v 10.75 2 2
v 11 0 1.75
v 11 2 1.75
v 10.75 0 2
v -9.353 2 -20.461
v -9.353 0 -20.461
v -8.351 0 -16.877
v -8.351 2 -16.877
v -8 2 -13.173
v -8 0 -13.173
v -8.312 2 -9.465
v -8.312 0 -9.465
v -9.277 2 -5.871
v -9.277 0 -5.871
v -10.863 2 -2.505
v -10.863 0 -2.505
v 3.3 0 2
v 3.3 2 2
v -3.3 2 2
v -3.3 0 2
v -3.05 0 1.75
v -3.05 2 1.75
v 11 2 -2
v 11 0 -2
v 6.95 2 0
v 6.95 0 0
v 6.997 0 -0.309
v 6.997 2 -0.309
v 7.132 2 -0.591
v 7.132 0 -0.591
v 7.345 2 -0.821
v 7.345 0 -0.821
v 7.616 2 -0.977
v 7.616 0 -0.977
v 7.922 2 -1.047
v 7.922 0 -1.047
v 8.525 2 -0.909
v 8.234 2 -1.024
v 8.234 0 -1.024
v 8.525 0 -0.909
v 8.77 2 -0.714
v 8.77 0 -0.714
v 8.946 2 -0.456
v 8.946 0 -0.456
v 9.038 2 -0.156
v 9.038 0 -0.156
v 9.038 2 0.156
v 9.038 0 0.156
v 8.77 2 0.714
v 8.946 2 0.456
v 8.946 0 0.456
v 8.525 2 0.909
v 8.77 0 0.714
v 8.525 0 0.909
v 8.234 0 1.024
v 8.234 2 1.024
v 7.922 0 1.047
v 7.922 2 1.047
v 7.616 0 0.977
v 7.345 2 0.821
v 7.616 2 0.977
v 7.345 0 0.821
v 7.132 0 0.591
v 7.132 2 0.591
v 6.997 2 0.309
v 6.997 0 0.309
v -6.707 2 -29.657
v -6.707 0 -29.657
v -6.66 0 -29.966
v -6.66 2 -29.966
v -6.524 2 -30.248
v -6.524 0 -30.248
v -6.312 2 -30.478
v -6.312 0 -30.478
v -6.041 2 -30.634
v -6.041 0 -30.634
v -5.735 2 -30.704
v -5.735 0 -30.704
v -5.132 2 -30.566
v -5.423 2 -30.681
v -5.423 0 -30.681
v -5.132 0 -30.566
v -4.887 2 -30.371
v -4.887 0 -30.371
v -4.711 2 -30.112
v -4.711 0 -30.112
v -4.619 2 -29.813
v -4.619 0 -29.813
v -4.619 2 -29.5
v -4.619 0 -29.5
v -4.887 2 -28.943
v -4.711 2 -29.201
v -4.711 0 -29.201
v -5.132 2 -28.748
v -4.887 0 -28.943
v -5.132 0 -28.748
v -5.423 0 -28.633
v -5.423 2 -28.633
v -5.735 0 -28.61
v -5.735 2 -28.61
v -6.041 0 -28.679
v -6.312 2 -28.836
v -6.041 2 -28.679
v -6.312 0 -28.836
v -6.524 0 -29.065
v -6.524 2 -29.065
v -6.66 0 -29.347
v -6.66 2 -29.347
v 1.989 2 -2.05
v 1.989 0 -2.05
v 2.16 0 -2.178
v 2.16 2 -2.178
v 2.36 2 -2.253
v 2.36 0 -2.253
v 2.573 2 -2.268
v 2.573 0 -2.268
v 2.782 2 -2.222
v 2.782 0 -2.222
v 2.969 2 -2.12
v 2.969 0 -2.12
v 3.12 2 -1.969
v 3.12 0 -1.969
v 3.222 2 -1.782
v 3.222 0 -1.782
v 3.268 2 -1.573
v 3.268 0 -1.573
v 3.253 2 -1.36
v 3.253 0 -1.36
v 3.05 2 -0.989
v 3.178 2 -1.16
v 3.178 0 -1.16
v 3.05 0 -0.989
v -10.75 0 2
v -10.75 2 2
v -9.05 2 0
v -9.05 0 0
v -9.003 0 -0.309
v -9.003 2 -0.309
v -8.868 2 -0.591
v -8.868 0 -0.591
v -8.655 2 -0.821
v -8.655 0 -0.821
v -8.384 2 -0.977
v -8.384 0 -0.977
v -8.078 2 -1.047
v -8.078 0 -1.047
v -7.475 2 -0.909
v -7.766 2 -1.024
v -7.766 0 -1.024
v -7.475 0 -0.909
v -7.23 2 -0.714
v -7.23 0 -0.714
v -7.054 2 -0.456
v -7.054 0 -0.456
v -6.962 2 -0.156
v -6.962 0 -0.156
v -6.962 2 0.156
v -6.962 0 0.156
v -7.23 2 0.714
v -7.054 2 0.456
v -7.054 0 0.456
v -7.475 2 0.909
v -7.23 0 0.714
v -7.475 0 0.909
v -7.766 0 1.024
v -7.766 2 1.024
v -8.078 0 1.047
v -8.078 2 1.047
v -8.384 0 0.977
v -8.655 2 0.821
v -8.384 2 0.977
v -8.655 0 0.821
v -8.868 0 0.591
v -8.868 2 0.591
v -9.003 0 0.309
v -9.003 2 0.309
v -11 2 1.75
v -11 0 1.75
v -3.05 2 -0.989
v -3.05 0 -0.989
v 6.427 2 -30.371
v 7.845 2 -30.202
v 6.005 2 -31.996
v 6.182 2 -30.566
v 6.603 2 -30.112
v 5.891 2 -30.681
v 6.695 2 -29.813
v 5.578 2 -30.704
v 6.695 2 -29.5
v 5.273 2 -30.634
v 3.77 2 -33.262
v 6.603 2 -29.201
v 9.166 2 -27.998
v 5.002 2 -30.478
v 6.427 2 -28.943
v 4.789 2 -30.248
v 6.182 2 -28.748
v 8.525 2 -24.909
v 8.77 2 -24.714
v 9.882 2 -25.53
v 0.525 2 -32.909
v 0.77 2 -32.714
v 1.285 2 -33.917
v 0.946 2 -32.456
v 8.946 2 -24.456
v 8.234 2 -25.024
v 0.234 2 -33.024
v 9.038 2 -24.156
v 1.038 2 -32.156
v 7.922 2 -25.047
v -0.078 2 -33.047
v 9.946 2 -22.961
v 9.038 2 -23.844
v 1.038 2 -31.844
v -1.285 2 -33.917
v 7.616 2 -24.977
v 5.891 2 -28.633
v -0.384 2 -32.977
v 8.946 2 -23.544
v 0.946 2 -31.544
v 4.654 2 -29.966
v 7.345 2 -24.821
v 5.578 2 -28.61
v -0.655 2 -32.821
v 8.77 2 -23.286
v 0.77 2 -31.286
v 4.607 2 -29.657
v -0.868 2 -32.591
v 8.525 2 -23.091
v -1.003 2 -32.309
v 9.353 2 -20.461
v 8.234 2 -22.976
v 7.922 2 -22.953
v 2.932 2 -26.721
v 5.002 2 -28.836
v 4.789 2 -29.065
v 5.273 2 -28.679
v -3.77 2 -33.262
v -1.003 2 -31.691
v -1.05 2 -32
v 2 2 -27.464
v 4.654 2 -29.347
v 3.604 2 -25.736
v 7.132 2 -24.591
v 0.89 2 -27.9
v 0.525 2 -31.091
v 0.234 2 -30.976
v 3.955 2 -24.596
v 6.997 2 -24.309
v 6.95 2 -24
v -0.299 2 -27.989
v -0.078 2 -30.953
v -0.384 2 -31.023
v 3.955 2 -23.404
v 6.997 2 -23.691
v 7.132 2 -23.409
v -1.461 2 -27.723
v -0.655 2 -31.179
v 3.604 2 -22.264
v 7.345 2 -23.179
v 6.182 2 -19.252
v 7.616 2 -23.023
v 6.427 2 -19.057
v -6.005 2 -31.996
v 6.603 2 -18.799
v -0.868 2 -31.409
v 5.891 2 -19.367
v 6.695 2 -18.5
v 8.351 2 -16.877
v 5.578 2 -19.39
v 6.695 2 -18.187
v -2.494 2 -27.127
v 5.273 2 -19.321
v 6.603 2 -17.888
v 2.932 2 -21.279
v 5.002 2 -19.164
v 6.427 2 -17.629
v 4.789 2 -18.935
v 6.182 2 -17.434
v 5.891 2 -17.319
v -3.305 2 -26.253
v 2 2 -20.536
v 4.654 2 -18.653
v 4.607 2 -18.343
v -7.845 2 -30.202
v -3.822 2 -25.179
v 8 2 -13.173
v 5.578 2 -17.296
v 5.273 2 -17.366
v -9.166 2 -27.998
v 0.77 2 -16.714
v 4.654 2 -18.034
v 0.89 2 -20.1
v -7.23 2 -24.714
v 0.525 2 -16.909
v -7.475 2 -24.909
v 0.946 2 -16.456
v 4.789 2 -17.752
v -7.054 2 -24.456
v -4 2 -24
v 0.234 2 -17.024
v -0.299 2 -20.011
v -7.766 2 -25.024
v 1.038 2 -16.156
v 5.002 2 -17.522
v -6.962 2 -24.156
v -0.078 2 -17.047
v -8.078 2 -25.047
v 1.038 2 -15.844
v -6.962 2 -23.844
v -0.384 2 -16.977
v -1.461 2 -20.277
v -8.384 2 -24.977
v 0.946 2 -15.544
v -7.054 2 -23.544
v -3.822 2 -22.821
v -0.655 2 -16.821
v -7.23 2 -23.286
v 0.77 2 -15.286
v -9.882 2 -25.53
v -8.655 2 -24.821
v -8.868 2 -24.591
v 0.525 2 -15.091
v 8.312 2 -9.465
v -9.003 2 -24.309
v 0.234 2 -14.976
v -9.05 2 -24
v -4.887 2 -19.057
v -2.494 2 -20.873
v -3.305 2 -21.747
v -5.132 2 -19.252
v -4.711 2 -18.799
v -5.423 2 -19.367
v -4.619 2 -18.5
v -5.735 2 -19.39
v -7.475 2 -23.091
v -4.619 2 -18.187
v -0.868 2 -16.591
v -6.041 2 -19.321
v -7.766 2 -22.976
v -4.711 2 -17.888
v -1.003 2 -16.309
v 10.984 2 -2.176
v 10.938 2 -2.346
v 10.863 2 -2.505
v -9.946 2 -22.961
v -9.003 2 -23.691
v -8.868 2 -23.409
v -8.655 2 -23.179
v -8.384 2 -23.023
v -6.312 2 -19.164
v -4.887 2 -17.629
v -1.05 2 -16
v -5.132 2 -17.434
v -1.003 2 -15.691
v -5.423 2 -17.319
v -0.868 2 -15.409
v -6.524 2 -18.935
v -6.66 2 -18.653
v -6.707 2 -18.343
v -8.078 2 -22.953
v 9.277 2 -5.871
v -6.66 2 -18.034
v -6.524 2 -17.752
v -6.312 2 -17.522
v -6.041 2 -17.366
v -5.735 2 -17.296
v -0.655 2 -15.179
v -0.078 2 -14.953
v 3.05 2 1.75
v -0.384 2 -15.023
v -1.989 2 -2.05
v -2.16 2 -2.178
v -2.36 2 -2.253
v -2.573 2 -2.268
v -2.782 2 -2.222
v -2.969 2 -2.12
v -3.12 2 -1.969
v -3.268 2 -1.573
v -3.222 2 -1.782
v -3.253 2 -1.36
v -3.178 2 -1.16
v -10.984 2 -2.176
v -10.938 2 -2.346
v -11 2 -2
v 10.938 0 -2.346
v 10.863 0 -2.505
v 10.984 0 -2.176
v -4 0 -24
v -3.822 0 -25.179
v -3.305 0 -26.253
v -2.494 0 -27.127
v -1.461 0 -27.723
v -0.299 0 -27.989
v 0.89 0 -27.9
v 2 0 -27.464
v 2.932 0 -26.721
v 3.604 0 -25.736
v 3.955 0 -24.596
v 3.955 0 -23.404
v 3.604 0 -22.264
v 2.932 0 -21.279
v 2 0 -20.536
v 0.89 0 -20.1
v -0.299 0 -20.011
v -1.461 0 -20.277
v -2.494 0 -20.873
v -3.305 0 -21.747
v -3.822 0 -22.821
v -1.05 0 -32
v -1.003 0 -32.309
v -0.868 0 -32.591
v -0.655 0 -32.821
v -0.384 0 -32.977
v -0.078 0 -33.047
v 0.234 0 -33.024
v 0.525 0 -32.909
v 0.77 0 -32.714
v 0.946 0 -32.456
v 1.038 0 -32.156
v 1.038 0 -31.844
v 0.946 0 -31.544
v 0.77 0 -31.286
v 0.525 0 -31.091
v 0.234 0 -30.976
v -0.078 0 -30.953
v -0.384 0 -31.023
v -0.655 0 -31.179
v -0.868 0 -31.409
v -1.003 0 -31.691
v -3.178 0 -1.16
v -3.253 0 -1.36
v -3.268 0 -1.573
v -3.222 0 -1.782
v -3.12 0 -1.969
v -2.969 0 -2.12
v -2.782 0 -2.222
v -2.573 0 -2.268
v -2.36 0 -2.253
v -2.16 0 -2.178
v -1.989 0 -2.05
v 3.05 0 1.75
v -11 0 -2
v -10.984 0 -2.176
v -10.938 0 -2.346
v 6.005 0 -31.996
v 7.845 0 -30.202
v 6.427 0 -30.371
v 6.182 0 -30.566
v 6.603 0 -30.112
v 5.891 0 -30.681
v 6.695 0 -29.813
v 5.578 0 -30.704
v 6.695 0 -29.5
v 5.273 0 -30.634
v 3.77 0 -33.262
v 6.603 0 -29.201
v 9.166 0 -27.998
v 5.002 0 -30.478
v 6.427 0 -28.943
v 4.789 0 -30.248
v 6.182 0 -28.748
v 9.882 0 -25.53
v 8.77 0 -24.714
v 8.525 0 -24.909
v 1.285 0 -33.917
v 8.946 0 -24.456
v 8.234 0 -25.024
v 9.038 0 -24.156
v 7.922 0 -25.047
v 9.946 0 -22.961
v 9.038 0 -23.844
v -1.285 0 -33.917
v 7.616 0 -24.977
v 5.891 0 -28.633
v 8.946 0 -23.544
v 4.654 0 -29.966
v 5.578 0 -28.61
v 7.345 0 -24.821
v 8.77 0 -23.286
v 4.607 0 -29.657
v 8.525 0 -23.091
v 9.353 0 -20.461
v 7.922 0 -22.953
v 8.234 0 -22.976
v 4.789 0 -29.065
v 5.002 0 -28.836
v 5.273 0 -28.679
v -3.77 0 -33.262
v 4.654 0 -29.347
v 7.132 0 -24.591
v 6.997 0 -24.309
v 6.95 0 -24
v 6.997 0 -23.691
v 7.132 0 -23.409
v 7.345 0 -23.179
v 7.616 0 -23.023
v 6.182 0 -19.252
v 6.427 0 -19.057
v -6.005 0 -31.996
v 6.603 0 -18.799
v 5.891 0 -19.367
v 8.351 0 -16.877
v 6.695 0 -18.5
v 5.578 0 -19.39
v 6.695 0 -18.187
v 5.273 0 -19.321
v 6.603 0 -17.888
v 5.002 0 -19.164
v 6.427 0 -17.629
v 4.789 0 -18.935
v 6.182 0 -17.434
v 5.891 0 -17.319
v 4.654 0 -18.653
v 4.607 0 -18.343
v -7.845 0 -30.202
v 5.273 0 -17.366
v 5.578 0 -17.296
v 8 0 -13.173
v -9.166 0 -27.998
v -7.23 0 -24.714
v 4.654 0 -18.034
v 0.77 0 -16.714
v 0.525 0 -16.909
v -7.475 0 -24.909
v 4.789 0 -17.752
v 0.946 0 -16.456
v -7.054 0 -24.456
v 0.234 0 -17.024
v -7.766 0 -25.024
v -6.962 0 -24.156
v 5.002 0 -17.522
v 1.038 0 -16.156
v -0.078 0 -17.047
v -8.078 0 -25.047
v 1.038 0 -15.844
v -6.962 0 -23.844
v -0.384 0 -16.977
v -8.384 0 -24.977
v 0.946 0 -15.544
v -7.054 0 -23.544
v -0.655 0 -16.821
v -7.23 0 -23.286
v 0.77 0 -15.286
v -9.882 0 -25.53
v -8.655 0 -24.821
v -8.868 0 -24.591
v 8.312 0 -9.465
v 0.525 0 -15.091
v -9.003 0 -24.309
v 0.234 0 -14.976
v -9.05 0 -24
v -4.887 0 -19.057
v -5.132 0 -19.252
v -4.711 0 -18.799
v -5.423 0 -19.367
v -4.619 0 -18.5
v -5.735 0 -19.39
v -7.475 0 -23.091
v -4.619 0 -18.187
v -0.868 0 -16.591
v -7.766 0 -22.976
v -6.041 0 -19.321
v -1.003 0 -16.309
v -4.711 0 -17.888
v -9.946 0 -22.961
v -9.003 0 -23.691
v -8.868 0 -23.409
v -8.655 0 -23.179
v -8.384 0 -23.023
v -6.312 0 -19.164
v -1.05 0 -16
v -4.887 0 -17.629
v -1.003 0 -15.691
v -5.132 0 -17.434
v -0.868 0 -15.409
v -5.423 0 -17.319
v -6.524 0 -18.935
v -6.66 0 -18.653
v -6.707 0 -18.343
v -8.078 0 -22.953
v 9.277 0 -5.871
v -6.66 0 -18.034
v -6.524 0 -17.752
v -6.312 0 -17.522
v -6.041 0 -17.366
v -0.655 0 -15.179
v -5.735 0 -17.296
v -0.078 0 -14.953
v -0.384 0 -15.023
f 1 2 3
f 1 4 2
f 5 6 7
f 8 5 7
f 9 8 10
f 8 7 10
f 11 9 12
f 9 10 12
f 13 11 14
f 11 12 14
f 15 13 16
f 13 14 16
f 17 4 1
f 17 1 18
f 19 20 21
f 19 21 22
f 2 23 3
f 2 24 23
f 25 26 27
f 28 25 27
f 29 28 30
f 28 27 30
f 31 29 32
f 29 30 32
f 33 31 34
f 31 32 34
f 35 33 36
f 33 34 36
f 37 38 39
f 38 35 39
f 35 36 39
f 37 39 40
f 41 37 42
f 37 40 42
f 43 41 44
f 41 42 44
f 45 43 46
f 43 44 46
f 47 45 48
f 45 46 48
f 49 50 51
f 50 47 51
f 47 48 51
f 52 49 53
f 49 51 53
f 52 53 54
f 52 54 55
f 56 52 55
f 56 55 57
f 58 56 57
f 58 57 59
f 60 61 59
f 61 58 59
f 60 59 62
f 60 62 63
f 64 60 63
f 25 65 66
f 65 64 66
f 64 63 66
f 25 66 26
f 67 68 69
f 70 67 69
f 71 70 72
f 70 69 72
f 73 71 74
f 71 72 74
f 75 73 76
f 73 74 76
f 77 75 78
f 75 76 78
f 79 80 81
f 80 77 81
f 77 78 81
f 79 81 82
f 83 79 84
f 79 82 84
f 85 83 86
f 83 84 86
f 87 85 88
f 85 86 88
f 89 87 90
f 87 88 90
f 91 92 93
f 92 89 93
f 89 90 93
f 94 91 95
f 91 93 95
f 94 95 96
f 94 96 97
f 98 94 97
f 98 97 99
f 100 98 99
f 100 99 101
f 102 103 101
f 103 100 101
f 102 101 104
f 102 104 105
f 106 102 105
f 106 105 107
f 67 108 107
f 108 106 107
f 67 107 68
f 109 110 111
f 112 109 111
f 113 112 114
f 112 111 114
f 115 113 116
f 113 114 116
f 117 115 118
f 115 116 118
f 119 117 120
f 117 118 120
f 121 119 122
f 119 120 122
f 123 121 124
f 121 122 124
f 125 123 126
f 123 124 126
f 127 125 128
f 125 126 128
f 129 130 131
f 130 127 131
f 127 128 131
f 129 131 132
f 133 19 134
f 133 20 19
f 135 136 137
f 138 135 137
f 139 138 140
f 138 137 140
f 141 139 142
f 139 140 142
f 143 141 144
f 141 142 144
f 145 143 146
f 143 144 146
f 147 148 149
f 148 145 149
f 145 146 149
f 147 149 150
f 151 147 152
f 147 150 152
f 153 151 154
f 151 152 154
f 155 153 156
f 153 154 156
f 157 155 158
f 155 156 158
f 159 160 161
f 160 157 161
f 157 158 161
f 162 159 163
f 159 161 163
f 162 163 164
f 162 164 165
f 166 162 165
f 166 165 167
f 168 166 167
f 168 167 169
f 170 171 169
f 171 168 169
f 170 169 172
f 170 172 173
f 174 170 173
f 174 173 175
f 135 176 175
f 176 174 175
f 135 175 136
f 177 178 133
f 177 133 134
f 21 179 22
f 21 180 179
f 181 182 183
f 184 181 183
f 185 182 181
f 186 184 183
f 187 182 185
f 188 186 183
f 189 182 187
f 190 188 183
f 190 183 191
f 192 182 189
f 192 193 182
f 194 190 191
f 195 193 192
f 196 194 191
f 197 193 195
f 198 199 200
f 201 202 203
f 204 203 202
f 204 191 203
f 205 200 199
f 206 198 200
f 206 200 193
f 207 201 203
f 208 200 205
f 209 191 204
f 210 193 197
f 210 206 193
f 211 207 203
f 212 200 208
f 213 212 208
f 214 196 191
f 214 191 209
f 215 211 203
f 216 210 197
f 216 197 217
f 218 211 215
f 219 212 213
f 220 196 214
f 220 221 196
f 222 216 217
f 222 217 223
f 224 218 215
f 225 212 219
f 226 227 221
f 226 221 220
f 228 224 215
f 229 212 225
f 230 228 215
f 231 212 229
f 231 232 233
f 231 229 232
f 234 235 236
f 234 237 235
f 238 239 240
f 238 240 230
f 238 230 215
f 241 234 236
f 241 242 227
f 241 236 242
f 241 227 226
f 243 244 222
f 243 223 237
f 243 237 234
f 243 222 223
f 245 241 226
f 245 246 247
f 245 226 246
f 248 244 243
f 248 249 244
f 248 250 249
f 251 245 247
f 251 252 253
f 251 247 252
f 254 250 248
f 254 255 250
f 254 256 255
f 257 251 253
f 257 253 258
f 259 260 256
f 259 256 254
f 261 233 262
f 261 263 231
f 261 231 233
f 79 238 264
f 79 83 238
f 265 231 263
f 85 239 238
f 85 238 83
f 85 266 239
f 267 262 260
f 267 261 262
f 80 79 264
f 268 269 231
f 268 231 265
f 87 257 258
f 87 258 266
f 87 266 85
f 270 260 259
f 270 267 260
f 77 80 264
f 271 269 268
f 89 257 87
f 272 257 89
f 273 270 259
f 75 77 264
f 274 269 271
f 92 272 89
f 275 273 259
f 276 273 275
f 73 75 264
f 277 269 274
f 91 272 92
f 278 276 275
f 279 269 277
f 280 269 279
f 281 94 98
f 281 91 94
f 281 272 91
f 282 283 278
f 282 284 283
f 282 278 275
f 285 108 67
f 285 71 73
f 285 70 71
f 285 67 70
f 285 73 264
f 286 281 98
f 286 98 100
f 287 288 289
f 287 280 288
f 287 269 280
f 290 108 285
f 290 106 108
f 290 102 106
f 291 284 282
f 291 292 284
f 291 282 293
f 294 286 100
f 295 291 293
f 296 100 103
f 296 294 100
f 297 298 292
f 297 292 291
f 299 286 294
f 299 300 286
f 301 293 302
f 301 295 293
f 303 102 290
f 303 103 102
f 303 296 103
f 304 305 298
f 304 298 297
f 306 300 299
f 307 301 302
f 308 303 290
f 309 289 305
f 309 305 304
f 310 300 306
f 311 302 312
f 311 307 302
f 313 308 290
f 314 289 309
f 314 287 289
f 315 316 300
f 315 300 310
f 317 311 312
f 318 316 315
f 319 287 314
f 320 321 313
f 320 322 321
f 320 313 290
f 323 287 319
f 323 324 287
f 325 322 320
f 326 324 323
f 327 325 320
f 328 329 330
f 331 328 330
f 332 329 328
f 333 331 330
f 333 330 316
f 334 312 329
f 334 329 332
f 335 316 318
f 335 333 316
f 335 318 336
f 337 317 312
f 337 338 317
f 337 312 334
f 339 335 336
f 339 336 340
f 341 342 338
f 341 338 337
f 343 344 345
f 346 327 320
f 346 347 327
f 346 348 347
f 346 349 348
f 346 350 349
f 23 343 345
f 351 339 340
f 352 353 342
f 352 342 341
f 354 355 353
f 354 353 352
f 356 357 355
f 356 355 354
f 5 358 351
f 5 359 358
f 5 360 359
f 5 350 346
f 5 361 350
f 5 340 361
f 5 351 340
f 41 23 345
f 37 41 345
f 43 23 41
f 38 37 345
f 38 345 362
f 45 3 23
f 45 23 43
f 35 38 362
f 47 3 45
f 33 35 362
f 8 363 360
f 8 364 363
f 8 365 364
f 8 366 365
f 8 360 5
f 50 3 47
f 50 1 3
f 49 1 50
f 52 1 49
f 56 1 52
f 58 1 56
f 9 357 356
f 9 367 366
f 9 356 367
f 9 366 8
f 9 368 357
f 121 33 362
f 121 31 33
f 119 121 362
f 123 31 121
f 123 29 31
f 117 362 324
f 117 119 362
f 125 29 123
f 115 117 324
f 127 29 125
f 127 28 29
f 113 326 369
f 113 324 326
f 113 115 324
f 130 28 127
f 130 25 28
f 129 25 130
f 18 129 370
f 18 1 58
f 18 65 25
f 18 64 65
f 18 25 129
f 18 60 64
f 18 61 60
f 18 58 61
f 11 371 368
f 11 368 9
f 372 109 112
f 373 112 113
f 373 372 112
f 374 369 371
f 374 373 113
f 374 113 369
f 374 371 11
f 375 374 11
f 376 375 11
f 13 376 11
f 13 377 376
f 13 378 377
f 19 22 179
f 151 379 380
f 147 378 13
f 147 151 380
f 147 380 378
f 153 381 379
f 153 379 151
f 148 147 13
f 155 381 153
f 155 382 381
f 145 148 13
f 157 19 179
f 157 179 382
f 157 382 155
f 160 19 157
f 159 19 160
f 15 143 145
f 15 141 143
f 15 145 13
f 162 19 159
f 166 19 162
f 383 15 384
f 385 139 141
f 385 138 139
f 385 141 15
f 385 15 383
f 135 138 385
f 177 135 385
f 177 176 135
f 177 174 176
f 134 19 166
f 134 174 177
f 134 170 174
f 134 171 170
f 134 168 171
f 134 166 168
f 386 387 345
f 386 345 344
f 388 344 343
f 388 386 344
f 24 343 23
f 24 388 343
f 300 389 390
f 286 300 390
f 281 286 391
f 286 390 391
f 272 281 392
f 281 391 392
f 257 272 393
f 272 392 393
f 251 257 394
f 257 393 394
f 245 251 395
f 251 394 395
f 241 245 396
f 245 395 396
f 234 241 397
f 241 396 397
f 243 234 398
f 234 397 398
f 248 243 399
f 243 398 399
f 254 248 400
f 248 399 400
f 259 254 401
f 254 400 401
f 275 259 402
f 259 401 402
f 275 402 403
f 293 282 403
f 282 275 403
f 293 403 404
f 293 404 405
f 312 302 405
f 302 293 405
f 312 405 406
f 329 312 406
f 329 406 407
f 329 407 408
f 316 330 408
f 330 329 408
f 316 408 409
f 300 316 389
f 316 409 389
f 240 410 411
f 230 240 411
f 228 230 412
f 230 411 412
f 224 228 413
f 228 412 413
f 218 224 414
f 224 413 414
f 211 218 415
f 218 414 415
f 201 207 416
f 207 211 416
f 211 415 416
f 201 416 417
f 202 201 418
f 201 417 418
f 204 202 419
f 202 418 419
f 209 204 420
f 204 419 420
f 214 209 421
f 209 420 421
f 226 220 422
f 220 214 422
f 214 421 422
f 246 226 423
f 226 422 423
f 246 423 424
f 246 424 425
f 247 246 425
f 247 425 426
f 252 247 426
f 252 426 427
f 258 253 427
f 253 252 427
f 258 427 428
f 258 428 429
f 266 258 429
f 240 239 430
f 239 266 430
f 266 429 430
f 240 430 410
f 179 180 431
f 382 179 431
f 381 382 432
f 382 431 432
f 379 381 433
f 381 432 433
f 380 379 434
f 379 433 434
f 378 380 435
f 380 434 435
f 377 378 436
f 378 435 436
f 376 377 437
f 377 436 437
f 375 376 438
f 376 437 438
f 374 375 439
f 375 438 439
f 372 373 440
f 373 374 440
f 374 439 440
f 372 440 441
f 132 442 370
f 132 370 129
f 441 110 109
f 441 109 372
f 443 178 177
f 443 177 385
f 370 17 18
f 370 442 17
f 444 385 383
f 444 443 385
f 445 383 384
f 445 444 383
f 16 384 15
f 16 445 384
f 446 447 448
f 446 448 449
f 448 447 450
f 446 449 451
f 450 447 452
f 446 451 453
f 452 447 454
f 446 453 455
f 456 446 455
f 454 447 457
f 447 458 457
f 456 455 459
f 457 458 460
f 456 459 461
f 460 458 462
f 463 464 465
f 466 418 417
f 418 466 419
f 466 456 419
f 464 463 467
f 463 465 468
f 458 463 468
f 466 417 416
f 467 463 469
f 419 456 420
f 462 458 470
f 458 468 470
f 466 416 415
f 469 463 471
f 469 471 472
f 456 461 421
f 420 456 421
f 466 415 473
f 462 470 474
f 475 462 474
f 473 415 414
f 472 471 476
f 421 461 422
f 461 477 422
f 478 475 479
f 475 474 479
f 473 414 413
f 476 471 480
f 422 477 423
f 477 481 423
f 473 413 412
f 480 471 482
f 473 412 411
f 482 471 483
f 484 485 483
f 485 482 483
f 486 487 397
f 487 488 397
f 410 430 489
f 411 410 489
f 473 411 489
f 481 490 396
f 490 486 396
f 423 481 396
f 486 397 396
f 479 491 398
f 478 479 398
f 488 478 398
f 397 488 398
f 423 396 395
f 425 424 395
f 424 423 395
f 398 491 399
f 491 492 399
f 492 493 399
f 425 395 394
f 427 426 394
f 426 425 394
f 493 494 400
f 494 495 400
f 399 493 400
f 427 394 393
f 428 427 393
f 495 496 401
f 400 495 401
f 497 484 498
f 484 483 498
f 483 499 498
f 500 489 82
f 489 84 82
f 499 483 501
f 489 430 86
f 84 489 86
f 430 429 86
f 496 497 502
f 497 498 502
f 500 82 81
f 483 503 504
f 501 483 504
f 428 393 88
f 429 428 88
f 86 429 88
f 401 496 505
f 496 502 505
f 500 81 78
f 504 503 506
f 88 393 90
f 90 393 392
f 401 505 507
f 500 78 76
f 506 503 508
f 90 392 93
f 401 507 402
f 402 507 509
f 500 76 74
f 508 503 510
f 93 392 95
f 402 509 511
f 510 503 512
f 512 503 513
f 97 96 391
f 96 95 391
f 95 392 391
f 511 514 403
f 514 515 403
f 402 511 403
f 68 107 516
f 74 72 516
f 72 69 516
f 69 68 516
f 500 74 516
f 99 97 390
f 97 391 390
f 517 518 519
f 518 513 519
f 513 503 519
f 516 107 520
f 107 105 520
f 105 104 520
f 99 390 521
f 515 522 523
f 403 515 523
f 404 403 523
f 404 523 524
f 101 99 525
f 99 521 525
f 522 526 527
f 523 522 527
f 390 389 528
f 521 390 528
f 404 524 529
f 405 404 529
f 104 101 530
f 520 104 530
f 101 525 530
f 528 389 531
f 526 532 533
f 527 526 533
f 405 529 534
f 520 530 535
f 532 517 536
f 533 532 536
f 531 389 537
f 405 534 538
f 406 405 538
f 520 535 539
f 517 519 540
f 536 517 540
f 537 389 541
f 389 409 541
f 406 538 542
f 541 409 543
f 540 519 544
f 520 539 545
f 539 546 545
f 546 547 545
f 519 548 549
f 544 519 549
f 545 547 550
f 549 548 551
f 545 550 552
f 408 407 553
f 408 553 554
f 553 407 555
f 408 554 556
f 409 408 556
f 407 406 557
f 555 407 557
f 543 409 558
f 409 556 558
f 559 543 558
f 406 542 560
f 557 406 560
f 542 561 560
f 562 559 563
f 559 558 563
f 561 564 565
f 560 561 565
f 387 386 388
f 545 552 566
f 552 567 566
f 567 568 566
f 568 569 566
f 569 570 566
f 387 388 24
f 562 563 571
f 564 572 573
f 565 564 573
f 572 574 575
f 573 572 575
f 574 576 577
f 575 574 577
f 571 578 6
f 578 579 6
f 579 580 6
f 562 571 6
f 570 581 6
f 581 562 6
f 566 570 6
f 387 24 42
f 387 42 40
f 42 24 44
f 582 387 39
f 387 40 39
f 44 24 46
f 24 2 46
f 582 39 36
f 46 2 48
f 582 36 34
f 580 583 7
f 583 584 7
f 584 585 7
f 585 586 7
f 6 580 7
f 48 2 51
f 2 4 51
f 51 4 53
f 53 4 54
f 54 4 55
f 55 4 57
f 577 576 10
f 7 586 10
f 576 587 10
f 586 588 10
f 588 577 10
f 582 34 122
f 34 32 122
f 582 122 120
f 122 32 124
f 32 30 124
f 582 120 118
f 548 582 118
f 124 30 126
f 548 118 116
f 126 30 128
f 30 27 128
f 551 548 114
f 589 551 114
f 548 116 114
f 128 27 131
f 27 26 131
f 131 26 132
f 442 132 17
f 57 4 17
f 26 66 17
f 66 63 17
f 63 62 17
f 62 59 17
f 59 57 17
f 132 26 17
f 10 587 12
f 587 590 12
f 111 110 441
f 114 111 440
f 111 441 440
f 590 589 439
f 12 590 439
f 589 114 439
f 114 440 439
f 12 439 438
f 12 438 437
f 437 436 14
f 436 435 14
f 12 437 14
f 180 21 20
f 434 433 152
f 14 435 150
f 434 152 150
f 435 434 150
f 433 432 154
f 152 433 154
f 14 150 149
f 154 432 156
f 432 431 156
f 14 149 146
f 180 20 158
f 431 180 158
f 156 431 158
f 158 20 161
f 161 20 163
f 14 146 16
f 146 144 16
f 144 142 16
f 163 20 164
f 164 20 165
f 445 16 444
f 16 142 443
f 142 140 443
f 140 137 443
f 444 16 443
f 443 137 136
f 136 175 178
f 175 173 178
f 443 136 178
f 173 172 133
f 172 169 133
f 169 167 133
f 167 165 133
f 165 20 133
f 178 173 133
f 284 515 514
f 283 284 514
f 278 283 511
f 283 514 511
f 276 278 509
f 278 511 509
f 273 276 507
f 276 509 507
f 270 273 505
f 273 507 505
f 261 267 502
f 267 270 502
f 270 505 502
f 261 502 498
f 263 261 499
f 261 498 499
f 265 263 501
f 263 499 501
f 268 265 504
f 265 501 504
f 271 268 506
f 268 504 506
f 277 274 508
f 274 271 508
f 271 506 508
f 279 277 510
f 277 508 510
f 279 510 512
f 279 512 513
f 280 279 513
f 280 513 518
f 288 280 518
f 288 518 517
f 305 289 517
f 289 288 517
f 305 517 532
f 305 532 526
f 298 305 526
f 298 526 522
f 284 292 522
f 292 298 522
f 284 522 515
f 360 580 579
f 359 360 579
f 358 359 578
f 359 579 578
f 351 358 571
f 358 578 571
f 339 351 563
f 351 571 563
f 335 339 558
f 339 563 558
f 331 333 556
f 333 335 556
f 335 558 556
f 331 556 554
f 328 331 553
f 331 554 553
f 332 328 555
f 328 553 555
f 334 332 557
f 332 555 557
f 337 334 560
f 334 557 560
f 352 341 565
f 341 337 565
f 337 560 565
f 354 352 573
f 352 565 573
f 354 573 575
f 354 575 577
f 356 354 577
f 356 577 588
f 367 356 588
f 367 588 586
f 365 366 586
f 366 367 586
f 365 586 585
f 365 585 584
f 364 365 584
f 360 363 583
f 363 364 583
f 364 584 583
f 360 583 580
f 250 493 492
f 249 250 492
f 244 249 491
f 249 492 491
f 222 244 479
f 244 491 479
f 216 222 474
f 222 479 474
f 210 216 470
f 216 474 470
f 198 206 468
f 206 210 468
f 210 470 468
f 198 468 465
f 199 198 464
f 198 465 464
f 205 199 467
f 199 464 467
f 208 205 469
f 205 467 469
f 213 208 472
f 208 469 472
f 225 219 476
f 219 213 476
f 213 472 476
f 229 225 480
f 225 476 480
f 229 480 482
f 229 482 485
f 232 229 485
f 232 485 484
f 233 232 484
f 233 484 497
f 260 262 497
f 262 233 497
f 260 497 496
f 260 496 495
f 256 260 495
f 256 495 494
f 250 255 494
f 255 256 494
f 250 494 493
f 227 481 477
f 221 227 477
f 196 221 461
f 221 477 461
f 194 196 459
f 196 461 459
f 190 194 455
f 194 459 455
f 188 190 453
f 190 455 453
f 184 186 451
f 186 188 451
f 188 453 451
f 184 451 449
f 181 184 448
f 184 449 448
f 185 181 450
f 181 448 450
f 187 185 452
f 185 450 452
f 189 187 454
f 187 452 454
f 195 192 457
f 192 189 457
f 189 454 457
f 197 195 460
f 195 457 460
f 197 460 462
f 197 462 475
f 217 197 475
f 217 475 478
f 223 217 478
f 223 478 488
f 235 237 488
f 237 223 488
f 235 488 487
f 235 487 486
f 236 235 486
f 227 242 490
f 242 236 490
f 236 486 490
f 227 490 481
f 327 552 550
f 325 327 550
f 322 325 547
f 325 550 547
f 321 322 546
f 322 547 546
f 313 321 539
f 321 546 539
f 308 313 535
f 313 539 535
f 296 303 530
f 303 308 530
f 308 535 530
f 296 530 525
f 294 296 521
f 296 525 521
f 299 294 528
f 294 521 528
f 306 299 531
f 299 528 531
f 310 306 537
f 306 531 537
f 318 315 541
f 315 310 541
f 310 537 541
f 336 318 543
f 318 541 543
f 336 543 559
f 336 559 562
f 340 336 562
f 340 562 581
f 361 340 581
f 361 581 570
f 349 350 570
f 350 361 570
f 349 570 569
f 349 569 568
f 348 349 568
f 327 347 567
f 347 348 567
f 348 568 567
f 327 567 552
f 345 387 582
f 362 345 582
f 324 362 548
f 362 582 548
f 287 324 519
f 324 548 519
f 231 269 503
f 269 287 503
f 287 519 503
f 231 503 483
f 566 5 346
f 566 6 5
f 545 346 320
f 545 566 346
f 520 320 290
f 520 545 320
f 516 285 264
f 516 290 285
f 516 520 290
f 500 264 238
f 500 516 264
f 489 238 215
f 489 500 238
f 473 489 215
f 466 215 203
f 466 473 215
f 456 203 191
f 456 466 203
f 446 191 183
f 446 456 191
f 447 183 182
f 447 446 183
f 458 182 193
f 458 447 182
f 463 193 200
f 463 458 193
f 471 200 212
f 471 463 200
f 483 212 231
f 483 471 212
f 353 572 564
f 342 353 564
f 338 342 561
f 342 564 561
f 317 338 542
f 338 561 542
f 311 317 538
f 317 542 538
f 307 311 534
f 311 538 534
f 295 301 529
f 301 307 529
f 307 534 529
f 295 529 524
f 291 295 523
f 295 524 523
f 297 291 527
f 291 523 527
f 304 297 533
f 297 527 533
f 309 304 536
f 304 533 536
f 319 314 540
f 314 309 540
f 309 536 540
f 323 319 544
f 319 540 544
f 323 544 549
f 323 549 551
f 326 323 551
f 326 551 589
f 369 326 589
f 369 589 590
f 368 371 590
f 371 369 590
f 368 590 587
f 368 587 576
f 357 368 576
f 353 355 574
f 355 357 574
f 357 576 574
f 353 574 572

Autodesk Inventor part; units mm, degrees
ref_plane "YZ Plane" through (0, 0, 0) normal (1, 0, 0) x (0, 1, 0)
ref_plane "XZ Plane" through (0, 0, 0) normal (0, 1, 0) x (-1, 0, 0)
ref_plane "XY Plane" through (0, 0, 0) normal (0, 0, 1) x (1, 0, 0)
sketch "スケッチ1" plane through (0, 0, 0) normal (0, 1, 0) x (-1, 0, 0)
  line L0 (0, 0) -> (0, -24) construction
  circle A0 centre (0, -24) radius 4
  arc A1 (-9.3528, -20.4608) -> (9.3528, -20.4608) centre (0, -24) ccw
  line L1 (11, -2) -> (-11, -2) construction
  line L2 (-11, -2) -> (-11, 2)
  line L3 (11, 2) -> (11, -2)
  line L4 (11, 0) -> (-11, 0) construction
  circle A2 centre (8, 0) radius 1.05
  circle A3 centre (-8, 0) radius 1.05
  circle A4 centre (0, -24) radius 8 construction
  circle A5 centre (5.6569, -18.3431) radius 1.05
  circle A6 centre (0, -16) radius 1.05
  circle A7 centre (-5.6569, -18.3431) radius 1.05
  circle A8 centre (-8, -24) radius 1.05
  circle A9 centre (-5.6569, -29.6569) radius 1.05
  circle A10 centre (0, -32) radius 1.05
  circle A11 centre (5.6569, -29.6569) radius 1.05
  circle A12 centre (8, -24) radius 1.05
  line L5 (-3.05, 2) -> (-3.05, -0.9893)
  line L6 (-3.05, -2.05) -> (-1.9893, -2.05) construction
  arc A13 (1.9893, -2.05) -> (3.05, -0.9893) centre (2.5197, -1.5197) ccw
  line L7 (3.05, -2.05) -> (2.5197, -1.5197) construction
  line L8 (3.05, -0.9893) -> (3.05, 2)
  arc A14 (-3.05, -0.9893) -> (-1.9893, -2.05) centre (-2.5197, -1.5197) ccw
  line L9 (-3.05, -2.05) -> (-2.5197, -1.5197) construction
  line L10 (-3.05, -0.9893) -> (-3.05, -2.05) construction
  line L11 (-1.9893, -2.05) -> (1.9893, -2.05)
  line L12 (3.05, -0.9893) -> (3.05, -2.05) construction
  line L13 (1.9893, -2.05) -> (3.05, -2.05) construction
  line L14 (-11, 2) -> (-3.05, 2)
  line L15 (3.05, 2) -> (11, 2)
  arc A15 (10.863, -2.5052) -> (11, -2) centre (10, -2) ccw
  arc A16 (10.863, -2.5052) -> (9.3528, -20.4608) centre (28.9008, -13.0637) ccw
  line L16 (8, -6.3971) -> (8, -16.9723) construction
  arc A17 (-11, -2) -> (-10.863, -2.5052) centre (-10, -2) ccw
  arc A18 (-9.3528, -20.4608) -> (-10.863, -2.5052) centre (-28.9008, -13.0637) ccw
  dimension "d18" = 16
  dimension "d0" = 22
  dimension "d1" = 8
  dimension "d2" = 10
  dimension "d5" = 16
  dimension "d6" = 2.1
  dimension "d16" = 360
  dimension "d19" = 2.1
  dimension "d20" = 22
  dimension "d23" = 0.75
  dimension "d26" = 6.1
  dimension "d28" = 45
  dimension "d29" = 0.75
  dimension "d30" = 45
  dimension "d32" = 4
  dimension "d33" = 4.05
  dimension "d34" = 1
  dimension "d35" = 16
extrude "押し出し1" add sketch "スケッチ1" along normal blind 2
chamfer "面取り1" distance 0.25 angle 45 4 edges at (11, 1, 2) (-11, 1, 2) (-3.05, 1, 2) (3.05, 1, 2)
sketch "Sketch6" plane through (0, 2, 0) normal (0, 1, 0) x (1, 0, 0)
  line L0 (3.3, -2) -> (3.05, -1.75) projected
  line L1 (3.3, -2) -> (10.75, -2) projected
  line L2 (11, -1.75) -> (10.75, -2) projected
  line L3 (11, -1.75) -> (11, 2) projected
  arc A0 (11, 2) -> (10.863, 2.5052) centre (10, 2) ccw projected
  arc A1 (9.3528, 20.4608) -> (10.863, 2.5052) centre (28.9008, 13.0637) ccw projected
  arc A2 (9.3528, 20.4608) -> (-9.3528, 20.4608) centre (0, 24) ccw projected
  arc A3 (-10.863, 2.5052) -> (-9.3528, 20.4608) centre (-28.9008, 13.0637) ccw projected
  arc A4 (-10.863, 2.5052) -> (-11, 2) centre (-10, 2) ccw projected
  line L4 (-11, 2) -> (-11, -1.75) projected
  line L5 (-10.75, -2) -> (-11, -1.75) projected
  line L6 (-10.75, -2) -> (-3.3, -2) projected
  line L7 (-3.05, -1.75) -> (-3.3, -2) projected
  line L8 (-3.05, -1.75) -> (-3.05, 0.9893) projected
  arc A5 (-1.9893, 2.05) -> (-3.05, 0.9893) centre (-2.5197, 1.5197) ccw projected
  line L9 (-1.9893, 2.05) -> (1.9893, 2.05) projected
  arc A6 (3.05, 0.9893) -> (1.9893, 2.05) centre (2.5197, 1.5197) ccw projected
  line L10 (3.05, 0.9893) -> (3.05, -1.75) projected
  circle A7 centre (0, 24) radius 4 projected
  circle A8 centre (-8, 24) radius 1.05 projected
  circle A9 centre (-5.6569, 29.6569) radius 1.05 projected
  circle A10 centre (0, 32) radius 1.05 projected
  circle A11 centre (5.6569, 29.6569) radius 1.05 projected
  circle A12 centre (8, 24) radius 1.05 projected
  circle A13 centre (5.6569, 18.3431) radius 1.05 projected
  circle A14 centre (0, 16) radius 1.05 projected
  circle A15 centre (-5.6569, 18.3431) radius 1.05 projected
  circle A16 centre (8, 0) radius 1.05 projected
  circle A17 centre (-8, 0) radius 1.05 projected
  point P0 (0, 0)
properties part number "16_046_COXA_FRAME_5_R1"
